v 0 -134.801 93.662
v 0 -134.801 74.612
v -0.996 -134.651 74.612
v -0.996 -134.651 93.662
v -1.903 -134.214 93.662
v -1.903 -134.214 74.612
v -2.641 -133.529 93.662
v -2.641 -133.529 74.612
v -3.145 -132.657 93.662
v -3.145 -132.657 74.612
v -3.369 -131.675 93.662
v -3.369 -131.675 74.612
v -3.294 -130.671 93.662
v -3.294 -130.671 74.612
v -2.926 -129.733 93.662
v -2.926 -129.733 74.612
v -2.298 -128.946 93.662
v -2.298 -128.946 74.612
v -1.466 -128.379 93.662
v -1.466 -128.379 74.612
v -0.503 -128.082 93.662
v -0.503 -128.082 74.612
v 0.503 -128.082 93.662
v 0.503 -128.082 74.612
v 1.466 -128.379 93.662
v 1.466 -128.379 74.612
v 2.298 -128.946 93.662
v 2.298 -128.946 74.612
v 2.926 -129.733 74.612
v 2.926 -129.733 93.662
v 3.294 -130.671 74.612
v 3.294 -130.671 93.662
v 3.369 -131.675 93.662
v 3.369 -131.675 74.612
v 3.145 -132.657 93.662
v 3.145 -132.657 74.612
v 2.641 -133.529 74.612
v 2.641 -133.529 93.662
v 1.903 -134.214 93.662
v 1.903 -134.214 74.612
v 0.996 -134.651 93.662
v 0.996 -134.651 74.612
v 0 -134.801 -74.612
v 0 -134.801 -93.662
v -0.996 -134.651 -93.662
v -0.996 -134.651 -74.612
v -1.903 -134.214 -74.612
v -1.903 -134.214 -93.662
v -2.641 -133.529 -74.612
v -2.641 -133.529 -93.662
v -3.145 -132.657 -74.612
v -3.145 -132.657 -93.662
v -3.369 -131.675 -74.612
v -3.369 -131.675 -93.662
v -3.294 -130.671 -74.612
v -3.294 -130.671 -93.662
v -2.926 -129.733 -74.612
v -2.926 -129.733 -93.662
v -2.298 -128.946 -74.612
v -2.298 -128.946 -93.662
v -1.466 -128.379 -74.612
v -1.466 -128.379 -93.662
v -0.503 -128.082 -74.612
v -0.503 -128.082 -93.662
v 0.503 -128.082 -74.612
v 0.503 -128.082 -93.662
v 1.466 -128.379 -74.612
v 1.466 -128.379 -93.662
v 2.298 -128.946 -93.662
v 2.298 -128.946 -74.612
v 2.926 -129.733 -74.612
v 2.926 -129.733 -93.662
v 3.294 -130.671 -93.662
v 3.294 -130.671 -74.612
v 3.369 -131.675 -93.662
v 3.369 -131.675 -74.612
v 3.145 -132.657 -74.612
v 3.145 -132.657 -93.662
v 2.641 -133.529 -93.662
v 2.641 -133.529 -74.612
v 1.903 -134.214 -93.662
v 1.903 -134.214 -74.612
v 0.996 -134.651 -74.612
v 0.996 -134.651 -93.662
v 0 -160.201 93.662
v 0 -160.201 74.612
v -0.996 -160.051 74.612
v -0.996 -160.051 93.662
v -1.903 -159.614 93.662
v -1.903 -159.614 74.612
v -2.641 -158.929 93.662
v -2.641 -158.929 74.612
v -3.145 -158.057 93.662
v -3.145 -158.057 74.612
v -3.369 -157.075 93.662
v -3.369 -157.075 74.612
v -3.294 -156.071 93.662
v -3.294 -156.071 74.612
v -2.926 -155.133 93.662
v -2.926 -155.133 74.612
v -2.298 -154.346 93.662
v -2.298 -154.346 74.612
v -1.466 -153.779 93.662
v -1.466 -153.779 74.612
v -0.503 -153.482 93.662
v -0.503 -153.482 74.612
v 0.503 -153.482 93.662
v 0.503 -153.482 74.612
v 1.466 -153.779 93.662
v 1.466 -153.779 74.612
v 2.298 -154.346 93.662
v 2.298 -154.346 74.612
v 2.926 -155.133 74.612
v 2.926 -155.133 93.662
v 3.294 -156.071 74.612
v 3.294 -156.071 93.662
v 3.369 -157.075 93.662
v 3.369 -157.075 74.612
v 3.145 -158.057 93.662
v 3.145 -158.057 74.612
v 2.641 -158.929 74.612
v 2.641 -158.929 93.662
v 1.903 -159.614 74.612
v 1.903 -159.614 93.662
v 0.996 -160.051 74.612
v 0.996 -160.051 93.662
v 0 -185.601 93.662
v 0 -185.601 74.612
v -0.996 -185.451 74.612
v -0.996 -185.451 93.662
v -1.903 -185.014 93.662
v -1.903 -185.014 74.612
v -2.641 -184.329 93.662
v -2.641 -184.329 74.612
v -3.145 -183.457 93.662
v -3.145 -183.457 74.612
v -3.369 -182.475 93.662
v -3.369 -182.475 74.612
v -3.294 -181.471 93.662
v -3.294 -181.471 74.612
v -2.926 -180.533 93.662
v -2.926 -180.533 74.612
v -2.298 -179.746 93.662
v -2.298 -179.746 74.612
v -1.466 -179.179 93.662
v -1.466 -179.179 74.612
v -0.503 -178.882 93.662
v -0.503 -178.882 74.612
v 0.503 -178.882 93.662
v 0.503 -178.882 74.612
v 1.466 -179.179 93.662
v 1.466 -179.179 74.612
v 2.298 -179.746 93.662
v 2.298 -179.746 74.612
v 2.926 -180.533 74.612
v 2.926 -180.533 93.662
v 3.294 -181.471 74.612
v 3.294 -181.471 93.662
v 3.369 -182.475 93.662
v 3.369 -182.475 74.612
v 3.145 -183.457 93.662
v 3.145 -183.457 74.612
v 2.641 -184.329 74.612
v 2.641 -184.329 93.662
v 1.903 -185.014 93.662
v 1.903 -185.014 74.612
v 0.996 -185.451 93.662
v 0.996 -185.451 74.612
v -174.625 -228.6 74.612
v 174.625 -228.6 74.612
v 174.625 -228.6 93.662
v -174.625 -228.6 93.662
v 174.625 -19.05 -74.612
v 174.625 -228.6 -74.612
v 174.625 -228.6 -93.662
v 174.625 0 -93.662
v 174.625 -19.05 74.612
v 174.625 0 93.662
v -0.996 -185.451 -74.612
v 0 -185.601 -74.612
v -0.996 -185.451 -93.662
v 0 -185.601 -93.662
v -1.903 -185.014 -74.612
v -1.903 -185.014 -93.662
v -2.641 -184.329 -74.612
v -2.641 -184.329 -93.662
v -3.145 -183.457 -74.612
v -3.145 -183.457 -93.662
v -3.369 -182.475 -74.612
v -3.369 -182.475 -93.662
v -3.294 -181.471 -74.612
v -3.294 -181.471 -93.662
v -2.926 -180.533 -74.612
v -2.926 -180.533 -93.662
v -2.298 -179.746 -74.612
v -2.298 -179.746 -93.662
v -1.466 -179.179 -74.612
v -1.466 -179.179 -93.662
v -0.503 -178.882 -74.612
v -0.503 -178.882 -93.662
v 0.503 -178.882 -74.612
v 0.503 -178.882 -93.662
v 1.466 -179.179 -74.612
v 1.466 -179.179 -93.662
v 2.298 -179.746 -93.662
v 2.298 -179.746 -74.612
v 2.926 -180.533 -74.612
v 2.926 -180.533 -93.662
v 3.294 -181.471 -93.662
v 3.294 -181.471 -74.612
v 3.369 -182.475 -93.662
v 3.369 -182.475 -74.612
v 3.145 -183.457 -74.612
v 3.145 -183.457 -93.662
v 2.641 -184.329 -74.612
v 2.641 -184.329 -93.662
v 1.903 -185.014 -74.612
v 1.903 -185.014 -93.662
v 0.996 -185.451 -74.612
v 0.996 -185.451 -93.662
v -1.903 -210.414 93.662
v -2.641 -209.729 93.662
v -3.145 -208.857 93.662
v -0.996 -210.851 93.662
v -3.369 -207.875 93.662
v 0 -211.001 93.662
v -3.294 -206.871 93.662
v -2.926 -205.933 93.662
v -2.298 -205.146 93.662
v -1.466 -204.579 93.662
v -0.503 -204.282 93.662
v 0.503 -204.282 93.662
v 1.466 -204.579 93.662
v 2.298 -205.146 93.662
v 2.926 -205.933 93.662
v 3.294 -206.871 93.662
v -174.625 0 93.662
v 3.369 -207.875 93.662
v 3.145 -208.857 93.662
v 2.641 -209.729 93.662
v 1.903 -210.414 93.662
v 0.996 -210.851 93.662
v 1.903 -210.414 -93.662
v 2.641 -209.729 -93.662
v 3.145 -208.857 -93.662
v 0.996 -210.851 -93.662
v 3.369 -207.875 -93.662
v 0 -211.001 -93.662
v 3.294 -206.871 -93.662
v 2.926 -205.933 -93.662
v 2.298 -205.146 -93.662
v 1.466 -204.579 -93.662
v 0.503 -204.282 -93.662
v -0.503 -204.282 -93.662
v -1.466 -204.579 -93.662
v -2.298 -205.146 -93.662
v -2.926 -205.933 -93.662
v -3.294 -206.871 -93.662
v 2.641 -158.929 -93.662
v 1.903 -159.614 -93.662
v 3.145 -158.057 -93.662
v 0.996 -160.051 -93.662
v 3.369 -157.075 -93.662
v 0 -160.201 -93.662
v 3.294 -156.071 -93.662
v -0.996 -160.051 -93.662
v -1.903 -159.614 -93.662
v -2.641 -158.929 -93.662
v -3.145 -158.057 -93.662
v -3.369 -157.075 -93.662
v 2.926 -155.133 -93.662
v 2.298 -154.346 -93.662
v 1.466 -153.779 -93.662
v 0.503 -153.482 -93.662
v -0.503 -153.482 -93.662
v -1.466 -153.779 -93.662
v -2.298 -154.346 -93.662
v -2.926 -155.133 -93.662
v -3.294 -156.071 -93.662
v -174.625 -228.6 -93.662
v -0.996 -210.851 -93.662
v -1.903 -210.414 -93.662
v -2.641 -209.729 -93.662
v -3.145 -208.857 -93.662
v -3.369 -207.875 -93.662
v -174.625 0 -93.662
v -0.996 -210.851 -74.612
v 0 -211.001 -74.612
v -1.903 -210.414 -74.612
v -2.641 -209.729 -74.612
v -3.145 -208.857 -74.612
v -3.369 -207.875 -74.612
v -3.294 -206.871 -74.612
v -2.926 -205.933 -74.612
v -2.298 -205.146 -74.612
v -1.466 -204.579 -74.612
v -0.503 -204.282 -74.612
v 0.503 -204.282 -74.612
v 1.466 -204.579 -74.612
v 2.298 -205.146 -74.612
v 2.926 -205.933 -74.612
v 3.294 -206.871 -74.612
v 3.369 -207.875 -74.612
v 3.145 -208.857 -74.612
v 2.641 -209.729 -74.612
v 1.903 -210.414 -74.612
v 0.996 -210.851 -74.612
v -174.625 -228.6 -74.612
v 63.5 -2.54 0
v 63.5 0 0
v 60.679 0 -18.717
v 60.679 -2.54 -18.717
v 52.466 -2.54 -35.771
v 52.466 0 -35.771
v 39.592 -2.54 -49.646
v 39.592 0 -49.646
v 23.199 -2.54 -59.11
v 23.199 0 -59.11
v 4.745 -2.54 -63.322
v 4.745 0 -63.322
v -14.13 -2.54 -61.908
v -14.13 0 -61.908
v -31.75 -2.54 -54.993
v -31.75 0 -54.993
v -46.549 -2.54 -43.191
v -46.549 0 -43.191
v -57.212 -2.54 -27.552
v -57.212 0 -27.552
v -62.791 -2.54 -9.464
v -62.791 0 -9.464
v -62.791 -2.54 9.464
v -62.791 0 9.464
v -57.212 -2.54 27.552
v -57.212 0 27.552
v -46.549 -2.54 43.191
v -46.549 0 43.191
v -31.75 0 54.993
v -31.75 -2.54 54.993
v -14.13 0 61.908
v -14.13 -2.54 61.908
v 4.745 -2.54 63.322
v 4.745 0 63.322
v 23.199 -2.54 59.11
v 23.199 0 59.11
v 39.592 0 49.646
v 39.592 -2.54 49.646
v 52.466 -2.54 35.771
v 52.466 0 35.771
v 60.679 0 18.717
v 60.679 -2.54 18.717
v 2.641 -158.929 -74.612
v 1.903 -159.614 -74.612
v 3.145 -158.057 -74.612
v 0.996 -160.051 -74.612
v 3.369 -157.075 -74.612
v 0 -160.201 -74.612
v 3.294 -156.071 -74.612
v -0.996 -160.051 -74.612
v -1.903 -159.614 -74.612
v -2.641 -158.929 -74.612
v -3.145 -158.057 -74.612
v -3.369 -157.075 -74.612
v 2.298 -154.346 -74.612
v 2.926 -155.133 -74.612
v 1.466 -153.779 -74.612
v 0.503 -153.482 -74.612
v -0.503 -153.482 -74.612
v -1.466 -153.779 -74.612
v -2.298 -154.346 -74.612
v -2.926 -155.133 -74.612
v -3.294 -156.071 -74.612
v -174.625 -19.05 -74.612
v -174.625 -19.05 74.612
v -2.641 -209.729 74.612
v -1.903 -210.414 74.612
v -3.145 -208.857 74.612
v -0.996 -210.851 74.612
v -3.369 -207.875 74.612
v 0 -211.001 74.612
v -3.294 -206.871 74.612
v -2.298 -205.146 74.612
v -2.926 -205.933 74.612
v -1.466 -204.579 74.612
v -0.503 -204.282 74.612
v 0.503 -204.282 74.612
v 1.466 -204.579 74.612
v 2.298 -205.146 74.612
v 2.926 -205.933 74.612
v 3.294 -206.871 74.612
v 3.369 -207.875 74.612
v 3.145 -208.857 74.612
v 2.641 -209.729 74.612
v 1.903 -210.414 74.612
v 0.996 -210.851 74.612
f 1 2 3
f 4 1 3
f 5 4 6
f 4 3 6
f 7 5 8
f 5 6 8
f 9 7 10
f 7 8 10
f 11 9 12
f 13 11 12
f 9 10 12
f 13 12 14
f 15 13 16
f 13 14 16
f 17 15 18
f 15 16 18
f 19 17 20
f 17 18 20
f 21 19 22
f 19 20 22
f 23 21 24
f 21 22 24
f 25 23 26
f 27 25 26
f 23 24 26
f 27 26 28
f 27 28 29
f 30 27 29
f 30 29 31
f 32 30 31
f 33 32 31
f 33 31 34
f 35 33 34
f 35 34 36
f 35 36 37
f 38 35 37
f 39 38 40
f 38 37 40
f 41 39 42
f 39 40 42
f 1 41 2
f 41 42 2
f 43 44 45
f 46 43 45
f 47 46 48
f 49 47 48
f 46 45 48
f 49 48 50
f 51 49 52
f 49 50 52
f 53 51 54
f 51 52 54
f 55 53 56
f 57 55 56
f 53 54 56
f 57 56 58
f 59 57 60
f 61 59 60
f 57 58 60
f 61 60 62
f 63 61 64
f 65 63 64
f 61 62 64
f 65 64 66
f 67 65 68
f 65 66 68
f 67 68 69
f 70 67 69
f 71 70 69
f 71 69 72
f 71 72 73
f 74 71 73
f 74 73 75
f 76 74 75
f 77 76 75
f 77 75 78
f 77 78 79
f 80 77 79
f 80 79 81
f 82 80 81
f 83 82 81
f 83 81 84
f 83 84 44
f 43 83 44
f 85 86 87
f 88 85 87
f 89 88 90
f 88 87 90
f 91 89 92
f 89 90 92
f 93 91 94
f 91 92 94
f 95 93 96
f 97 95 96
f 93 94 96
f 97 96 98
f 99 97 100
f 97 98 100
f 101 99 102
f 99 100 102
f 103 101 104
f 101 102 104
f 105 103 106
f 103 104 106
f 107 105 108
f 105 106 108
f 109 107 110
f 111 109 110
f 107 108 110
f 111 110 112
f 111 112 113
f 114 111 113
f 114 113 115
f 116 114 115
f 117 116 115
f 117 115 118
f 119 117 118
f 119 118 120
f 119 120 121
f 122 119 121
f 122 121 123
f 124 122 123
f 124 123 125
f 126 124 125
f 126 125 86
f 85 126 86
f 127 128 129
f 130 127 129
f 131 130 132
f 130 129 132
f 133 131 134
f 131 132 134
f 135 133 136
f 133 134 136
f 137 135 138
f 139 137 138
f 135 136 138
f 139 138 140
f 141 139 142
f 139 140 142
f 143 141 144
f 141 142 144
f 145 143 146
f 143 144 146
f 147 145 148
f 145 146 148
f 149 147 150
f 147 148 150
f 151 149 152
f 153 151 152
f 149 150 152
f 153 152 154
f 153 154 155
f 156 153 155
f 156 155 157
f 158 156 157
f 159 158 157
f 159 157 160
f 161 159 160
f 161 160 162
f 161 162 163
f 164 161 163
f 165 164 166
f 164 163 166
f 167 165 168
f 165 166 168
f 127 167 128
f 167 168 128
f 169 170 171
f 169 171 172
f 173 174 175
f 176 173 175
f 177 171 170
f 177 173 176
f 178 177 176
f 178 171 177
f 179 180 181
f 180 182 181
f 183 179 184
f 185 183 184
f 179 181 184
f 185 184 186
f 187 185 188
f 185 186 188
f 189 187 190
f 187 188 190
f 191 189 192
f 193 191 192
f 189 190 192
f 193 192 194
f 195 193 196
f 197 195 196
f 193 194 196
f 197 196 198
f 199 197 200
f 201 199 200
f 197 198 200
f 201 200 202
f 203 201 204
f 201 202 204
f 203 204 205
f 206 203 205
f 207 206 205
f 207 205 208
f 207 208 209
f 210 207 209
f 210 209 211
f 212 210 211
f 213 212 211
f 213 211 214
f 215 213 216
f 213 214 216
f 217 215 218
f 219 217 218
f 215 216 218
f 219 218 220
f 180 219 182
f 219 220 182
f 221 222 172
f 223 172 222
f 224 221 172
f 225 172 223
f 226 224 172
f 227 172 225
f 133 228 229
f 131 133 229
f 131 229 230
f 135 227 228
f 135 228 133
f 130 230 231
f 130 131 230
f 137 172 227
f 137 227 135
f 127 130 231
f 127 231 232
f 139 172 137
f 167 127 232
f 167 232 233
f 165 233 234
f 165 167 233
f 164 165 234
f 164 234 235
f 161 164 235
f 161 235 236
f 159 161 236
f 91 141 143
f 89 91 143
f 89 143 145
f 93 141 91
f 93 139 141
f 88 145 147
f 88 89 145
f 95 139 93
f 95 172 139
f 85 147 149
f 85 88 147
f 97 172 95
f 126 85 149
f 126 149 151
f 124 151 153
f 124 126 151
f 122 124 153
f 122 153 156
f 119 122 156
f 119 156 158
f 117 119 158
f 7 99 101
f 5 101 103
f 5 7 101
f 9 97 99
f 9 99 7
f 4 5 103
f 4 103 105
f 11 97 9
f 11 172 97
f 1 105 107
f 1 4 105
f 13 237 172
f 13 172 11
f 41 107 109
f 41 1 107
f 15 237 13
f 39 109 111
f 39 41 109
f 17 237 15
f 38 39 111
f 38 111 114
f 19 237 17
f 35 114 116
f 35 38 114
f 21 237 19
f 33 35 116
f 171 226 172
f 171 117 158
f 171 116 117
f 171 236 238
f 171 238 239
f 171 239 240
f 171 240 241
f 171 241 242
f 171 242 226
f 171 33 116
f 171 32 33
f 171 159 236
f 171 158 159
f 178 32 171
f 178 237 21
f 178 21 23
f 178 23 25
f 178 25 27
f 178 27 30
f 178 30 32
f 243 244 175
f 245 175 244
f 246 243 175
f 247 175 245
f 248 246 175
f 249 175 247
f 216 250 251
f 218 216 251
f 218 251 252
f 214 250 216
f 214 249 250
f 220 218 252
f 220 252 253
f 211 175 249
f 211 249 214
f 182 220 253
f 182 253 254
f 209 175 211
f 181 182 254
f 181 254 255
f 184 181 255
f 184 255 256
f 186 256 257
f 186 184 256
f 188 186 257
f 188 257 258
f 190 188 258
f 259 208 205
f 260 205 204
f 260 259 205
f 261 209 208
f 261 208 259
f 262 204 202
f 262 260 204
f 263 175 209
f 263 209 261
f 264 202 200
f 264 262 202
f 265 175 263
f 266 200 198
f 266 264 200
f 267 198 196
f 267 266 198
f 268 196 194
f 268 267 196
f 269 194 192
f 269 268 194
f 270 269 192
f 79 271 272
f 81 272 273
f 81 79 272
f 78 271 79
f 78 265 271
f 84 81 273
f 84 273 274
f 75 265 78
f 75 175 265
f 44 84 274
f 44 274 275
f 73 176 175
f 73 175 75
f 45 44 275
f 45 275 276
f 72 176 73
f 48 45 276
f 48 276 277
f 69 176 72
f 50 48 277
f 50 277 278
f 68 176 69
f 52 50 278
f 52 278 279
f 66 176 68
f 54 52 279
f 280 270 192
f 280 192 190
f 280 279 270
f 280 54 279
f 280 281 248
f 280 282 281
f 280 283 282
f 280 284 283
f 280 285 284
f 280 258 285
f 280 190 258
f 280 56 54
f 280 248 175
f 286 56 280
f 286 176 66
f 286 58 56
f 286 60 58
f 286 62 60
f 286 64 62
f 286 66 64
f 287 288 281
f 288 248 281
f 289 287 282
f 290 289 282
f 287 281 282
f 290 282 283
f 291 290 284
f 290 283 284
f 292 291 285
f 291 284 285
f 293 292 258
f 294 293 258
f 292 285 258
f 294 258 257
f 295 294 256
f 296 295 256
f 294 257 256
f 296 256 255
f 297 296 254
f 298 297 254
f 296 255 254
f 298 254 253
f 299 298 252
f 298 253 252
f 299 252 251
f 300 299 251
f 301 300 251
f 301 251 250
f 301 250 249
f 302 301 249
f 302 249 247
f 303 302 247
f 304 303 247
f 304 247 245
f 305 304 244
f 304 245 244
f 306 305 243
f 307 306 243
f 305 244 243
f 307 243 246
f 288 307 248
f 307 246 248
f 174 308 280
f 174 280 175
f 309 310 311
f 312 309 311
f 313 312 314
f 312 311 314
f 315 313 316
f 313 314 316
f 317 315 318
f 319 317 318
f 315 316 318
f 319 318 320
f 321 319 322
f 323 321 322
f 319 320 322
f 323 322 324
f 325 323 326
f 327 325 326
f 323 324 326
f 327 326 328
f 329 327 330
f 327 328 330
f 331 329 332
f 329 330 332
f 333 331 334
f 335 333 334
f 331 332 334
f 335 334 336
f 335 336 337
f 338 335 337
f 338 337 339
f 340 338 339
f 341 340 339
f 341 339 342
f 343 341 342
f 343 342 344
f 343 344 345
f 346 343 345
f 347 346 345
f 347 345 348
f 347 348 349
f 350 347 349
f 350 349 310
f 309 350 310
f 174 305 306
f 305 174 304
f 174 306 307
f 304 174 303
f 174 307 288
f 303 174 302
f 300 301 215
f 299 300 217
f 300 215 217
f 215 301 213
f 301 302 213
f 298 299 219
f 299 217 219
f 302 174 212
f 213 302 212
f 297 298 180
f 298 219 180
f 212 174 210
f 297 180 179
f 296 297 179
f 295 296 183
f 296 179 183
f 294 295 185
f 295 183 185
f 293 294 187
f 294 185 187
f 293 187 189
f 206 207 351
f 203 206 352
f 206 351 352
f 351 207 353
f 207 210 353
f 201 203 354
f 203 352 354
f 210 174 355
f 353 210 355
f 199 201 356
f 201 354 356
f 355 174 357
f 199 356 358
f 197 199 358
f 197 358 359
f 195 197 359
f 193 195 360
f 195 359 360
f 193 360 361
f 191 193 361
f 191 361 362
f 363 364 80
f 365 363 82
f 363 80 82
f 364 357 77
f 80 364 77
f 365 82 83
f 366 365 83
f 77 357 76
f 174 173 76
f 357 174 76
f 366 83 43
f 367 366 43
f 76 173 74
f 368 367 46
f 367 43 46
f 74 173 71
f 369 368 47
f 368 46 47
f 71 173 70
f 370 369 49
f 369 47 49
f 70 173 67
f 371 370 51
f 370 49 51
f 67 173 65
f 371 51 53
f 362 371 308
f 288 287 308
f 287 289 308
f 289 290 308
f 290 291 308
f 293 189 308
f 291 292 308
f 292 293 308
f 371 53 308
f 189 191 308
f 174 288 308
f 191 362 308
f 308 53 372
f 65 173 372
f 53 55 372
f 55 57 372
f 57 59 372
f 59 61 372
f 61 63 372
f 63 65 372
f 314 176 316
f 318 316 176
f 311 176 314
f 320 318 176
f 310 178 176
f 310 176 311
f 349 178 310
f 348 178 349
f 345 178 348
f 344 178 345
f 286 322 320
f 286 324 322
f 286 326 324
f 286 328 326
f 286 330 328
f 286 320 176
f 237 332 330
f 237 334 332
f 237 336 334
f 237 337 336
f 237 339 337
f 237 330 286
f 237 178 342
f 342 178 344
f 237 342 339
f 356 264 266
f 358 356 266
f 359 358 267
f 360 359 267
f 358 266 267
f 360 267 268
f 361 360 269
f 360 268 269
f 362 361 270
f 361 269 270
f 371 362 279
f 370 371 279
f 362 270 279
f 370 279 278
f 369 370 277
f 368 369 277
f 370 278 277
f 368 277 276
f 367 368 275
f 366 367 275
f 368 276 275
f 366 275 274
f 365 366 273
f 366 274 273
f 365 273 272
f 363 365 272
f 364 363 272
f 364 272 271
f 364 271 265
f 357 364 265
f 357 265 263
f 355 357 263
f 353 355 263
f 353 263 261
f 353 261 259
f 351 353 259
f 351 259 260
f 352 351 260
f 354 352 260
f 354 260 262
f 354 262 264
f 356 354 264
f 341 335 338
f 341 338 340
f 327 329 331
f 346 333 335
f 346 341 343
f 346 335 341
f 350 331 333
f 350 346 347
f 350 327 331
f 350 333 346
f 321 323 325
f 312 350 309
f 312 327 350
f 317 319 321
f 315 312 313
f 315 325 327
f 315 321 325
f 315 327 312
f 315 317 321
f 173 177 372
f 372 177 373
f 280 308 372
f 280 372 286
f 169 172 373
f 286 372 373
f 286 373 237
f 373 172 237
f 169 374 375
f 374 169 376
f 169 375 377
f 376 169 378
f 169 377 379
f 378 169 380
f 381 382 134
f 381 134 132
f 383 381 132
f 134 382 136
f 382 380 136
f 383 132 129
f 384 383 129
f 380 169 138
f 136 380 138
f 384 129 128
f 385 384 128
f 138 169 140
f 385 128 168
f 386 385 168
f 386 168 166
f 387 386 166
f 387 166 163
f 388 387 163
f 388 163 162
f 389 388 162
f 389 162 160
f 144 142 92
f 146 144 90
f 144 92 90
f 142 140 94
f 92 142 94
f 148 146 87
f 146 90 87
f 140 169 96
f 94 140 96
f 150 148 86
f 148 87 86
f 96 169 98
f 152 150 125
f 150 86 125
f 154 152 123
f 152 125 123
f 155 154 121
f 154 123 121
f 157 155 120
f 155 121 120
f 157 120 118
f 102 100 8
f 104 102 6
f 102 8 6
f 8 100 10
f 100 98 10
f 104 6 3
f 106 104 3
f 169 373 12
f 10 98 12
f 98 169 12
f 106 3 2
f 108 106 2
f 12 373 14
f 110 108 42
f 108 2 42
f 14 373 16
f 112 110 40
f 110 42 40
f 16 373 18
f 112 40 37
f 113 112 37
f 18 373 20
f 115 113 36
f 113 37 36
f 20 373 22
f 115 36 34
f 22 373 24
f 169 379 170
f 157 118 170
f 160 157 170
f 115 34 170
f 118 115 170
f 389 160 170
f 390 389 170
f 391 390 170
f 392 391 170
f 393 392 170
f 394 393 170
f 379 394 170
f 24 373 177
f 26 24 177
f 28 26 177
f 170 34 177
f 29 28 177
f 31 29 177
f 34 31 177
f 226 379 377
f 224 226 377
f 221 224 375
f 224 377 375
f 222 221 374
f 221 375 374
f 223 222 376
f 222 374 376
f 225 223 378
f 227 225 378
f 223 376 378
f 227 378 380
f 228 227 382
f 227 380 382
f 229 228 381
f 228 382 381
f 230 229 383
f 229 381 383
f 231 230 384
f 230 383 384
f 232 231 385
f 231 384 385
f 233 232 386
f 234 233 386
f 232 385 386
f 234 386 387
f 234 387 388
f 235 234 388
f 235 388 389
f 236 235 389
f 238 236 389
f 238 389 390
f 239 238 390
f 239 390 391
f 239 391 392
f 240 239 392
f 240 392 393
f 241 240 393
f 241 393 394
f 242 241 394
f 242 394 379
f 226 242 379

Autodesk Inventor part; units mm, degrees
ref_plane "YZ Plane" through (0, 0, 0) normal (1, 0, 0) x (0, 1, 0)
ref_plane "XZ Plane" through (0, 0, 0) normal (0, 1, 0) x (-1, 0, 0)
ref_plane "XY Plane" through (0, 0, 0) normal (0, 0, 1) x (1, 0, 0)
sketch "Sketch1" plane through (0, 0, 0) normal (0, 1, 0) x (-1, 0, 0)
  line L0 (174.625, 74.6125) -> (-174.625, 74.6125)
  line L1 (-174.625, 74.6125) -> (-174.625, -74.6125)
  line L2 (-174.625, -74.6125) -> (174.625, -74.6125)
  line L3 (174.625, -74.6125) -> (174.625, 74.6125)
  line L4 (174.625, 74.6125) -> (-174.625, -74.6125) construction
  line L5 (-174.625, 74.6125) -> (174.625, -74.6125) construction
  point P0 (0, 0)
  dimension "d0" = 149.225
  dimension "d4" = 349.25
extrude "Extrusion1" add sketch "Sketch1" against normal blind 19.05
sketch "Sketch3" plane through (-174.625, 0, 74.6125) normal (0, 0, 1) x (1, 0, 0)
  line L0 (0, 0) -> (349.25, 0) projected
  line L1 (0, 0) -> (0, -19.05) projected
  line L2 (349.25, 0) -> (349.25, -19.05) projected
  line L3 (0, 0) -> (349.25, 0)
  line L4 (349.25, 0) -> (349.25, -228.6)
  line L5 (349.25, -228.6) -> (0, -228.6)
  line L6 (0, -228.6) -> (0, 0)
  point P0 (174.625, 0)
  dimension "d5" = 228.6
extrude "Extrusion2" add sketch "Sketch3" along normal blind 19.05
mirror "Mirror1" about plane through (0, 0, 0) normal (0, 0, 1) of "Extrusion2"
sketch "Sketch4" plane through (-174.625, 0, 93.6625) normal (0, 0, 1) x (1, 0, 0)
  line L0 (174.625, 0) -> (174.625, -228.6) construction
  line L1 (0, -228.6) -> (349.25, -228.6) construction
  point P0 (174.625, -207.6224)
hole "Hole1" at (0, -207.6224, 93.6625) direction (0, 0, -1) diameter 6.7564 end through all clearance for "Flat Head Machine Screw (82)" size "1/4" standard "Ansi Unified Screw Threads"
pattern_linear "Rectangular Pattern1" count 4 spacing 25.4 along (0, 1, 0) of "Hole1"
sketch "Sketch5" plane through (0, 0, 0) normal (0, 1, 0) x (1, 0, 0)
  circle A0 centre (0, 0) radius 63.5
  dimension "d18" = 127
extrude "Extrusion3" cut sketch "Sketch5" against normal blind 2.54
equation "\"d0\" = widthTopBoard"
equation "\"d4\" = lengthTopBoard"
equation "\"d1\" = woodThickness"
equation "\"d6\" = woodThickness"
equation "\"widthTopBoard\" = 149.225"
equation "\"lengthTopBoard\" = 349.25"
equation "\"woodThickness\" = 19.05"
properties part number "woodBracketForCamera" material "Wood (Birch)"
